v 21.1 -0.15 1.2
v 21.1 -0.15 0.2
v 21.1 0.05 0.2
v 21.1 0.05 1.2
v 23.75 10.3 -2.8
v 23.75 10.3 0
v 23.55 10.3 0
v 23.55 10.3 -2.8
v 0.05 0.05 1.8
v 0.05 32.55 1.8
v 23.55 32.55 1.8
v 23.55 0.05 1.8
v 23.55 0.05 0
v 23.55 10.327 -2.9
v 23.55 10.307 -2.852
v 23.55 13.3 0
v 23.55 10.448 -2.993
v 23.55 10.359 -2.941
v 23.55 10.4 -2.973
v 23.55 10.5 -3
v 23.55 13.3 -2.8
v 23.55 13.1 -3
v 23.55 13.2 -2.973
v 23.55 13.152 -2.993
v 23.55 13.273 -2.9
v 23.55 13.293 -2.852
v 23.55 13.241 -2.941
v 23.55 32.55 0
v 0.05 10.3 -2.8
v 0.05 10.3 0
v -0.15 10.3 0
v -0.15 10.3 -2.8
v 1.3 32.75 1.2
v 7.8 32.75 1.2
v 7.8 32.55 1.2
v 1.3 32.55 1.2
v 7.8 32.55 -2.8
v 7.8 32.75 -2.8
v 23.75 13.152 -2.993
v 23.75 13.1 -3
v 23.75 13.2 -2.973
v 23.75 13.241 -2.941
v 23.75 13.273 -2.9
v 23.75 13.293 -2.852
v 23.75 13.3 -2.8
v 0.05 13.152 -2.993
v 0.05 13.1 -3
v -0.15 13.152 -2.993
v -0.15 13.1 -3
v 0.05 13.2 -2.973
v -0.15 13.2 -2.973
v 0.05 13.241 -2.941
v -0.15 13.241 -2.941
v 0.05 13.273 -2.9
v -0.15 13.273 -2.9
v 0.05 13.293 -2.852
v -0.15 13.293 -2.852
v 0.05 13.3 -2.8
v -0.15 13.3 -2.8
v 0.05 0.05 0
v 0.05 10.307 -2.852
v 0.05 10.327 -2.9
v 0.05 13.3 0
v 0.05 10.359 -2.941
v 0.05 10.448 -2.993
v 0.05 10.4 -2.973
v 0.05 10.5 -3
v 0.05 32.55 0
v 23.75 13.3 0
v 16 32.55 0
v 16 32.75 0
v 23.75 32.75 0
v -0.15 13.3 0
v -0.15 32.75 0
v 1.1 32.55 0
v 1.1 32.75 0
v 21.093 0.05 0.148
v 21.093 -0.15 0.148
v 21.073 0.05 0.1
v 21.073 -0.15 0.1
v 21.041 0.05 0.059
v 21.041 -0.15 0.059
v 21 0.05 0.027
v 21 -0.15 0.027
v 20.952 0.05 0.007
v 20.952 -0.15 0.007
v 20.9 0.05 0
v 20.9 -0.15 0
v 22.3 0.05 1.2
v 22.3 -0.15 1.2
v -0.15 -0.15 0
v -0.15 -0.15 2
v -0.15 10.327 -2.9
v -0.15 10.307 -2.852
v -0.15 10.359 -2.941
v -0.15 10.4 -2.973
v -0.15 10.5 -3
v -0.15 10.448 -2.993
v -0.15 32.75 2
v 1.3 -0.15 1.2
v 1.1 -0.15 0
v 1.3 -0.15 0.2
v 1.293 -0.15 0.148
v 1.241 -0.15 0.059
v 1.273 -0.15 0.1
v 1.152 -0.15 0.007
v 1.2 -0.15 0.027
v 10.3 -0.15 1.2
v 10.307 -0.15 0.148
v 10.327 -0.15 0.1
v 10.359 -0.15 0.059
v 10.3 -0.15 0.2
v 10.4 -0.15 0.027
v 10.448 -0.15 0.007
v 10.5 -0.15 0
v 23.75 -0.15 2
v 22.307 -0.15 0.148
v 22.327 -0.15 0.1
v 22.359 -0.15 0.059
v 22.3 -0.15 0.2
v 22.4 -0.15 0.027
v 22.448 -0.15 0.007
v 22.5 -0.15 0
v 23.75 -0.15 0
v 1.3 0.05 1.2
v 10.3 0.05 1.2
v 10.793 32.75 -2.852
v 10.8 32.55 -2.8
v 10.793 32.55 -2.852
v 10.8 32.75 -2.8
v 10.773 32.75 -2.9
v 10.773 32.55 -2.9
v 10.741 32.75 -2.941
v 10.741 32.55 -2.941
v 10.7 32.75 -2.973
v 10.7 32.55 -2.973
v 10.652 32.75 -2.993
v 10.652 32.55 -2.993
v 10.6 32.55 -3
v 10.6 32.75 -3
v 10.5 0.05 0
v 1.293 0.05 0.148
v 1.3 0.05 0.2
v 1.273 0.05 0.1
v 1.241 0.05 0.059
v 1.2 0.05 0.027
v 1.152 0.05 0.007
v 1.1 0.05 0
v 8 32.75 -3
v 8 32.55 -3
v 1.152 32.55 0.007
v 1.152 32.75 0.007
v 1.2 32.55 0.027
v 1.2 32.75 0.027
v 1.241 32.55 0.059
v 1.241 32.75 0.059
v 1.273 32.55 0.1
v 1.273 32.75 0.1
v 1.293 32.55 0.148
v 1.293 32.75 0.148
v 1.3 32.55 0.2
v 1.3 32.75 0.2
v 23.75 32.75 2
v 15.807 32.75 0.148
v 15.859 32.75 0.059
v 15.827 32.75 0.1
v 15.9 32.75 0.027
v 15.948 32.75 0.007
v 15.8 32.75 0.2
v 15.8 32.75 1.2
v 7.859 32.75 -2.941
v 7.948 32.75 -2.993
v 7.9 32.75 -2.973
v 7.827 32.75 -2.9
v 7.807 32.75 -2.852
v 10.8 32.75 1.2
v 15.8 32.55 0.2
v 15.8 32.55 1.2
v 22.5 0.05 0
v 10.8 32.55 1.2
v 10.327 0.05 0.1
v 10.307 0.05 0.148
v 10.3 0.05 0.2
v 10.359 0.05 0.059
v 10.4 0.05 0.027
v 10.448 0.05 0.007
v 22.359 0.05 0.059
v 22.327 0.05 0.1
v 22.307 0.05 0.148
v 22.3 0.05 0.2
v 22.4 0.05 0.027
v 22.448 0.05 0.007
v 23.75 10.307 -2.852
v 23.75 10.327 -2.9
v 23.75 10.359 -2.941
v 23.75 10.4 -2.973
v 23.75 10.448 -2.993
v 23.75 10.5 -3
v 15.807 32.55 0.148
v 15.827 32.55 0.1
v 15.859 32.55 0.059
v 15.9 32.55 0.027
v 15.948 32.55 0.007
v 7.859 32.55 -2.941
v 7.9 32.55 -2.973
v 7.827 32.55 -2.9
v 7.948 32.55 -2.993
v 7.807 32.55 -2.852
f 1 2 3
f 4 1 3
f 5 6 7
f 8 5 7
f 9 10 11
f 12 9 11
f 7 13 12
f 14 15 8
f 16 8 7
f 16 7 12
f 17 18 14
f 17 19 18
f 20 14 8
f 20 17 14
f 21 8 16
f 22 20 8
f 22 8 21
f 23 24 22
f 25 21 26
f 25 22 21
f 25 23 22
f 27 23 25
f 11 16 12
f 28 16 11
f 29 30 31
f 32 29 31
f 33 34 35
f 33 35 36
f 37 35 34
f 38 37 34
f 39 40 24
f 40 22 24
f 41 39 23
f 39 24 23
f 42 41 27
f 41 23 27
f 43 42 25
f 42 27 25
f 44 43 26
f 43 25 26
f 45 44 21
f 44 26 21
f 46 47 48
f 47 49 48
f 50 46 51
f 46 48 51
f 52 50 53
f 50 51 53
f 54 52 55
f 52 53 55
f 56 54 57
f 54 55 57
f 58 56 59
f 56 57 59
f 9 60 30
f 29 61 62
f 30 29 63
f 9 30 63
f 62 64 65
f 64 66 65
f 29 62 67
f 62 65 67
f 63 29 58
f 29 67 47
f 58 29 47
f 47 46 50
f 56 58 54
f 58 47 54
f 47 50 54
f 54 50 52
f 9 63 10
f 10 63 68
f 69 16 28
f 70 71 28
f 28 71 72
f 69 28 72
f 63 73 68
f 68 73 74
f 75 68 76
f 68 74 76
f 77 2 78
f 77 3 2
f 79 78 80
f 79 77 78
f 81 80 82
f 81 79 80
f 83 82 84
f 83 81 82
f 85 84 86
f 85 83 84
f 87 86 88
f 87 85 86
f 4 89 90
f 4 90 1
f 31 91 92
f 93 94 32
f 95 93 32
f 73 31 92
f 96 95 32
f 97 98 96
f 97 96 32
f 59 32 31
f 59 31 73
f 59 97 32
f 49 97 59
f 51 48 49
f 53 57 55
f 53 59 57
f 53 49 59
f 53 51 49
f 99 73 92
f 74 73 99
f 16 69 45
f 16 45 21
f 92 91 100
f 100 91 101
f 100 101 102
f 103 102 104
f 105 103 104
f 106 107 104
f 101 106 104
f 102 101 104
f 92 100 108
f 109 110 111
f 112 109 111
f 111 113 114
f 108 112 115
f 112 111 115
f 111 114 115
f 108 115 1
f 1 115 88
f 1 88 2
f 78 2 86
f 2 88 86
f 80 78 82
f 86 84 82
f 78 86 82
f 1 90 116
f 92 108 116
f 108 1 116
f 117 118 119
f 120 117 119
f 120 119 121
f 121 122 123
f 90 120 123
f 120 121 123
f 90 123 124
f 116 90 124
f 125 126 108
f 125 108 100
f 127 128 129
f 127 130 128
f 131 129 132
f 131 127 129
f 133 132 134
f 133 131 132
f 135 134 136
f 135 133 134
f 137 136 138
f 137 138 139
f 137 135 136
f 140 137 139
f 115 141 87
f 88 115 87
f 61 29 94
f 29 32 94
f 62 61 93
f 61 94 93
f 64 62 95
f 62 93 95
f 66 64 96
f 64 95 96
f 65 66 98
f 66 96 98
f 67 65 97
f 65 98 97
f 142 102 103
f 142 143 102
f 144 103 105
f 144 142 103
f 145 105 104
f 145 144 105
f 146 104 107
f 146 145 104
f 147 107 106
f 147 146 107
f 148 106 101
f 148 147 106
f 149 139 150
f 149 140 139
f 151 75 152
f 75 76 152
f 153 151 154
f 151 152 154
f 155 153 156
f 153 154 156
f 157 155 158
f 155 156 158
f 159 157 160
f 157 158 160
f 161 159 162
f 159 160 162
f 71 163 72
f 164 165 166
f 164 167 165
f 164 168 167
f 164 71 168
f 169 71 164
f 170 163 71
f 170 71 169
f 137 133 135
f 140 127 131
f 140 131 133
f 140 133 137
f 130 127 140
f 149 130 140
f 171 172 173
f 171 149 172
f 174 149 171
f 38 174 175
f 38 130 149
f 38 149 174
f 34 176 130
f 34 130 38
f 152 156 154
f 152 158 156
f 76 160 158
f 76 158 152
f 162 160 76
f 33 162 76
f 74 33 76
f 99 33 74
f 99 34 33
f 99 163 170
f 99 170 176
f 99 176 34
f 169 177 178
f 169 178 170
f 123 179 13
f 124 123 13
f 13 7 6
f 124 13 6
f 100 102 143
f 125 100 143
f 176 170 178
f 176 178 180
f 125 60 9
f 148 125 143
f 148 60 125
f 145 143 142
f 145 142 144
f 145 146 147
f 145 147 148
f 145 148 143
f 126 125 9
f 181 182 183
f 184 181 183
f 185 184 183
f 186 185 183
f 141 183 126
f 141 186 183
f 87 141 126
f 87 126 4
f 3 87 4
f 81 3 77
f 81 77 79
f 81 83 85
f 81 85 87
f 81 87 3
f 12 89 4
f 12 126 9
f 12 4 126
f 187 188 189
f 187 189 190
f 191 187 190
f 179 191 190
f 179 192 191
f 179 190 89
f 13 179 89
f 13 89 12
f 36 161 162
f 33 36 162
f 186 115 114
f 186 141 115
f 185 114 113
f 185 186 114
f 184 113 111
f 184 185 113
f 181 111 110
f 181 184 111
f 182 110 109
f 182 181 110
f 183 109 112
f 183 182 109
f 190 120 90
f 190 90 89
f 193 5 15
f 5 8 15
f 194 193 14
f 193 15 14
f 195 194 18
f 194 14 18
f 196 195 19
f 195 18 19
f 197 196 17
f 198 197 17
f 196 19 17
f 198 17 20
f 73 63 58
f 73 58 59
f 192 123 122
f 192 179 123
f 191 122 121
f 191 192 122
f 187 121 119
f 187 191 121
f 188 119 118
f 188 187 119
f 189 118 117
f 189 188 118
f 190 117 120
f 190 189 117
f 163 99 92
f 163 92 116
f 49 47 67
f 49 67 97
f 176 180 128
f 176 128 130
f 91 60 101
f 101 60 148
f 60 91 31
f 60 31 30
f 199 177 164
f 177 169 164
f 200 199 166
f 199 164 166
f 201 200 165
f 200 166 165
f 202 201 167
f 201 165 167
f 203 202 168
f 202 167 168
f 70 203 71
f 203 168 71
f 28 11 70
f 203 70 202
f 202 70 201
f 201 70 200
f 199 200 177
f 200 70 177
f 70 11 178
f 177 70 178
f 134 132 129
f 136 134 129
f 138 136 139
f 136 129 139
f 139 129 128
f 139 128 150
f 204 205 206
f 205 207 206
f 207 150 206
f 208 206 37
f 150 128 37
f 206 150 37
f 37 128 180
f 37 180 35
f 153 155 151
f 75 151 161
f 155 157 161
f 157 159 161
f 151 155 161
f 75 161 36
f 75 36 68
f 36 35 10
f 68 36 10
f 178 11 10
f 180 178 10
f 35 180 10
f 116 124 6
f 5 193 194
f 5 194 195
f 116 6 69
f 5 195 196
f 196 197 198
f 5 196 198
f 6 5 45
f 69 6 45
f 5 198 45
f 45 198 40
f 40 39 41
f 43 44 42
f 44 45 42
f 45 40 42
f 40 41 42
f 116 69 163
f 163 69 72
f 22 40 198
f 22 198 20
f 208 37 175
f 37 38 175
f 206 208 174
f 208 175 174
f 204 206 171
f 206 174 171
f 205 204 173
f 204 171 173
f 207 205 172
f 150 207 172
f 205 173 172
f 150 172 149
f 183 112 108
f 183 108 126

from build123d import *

# Parameters (mm, degrees)
SKETCH_1_W          = 23.9
SKETCH_1_H          = 32.9
EXTRUDE_1_DEPTH     = 2
SHELL_1_T           = -0.2
SKETCH_3_2_W        = 9
SKETCH_3_2_H        = 0.2
SKETCH_3_2_W_2      = 1.2
SKETCH_3_2_W_3      = 5
SKETCH_3_2_W_4      = 6.5
CUT_EXTRUDE_3_DEPTH = 1.2
SKETCH_3_W          = 3
SKETCH_3_H          = 0.2
SKETCH_3_W_2        = 0.2
SKETCH_3_H_2        = 3
EXTRUDE_2_DEPTH     = 3
FILLET_1_R          = 0.2


with BuildPart() as part:
    # Sketch 1 → Extrude 1 (new body)
    with BuildSketch(Plane.XY):
        with Locations((11.8, 16.3)):
            Rectangle(SKETCH_1_W, SKETCH_1_H)
    extrude(amount=EXTRUDE_1_DEPTH)

    # Shell 1
    shell_1_openings = [part.faces().sort_by_distance(p)[0] for p in [
        (11.8, 16.3, 0),
    ]]
    offset(amount=SHELL_1_T, openings=shell_1_openings, kind=Kind.INTERSECTION)

    # Sketch 3_2 → Cut-Extrude 3 (cut)
    with BuildSketch(Plane(origin=(0, 0, 0), x_dir=(-1, 0, 0), z_dir=(0, 0, -1))):
        with Locations((-5.8, -0.05)):
            Rectangle(SKETCH_3_2_W, SKETCH_3_2_H)
        with Locations((-21.7, -0.05)):
            Rectangle(SKETCH_3_2_W_2, SKETCH_3_2_H)
        with Locations((-13.3, 32.65)):
            Rectangle(SKETCH_3_2_W_3, SKETCH_3_2_H)
        with Locations((-4.55, 32.65)):
            Rectangle(SKETCH_3_2_W_4, SKETCH_3_2_H)
    extrude(amount=-CUT_EXTRUDE_3_DEPTH, mode=Mode.SUBTRACT)

    # Sketch 3 → Extrude 2 (add)
    with BuildSketch(Plane(origin=(0, 0, 0), x_dir=(-1, 0, 0), z_dir=(0, 0, -1))):
        with Locations((-9.3, 32.65)):
            Rectangle(SKETCH_3_W, SKETCH_3_H)
        with Locations((-23.65, 11.8)):
            Rectangle(SKETCH_3_W_2, SKETCH_3_H_2)
        with Locations((0.05, 11.8)):
            Rectangle(SKETCH_3_W_2, SKETCH_3_H_2)
    extrude(amount=EXTRUDE_2_DEPTH)

    # Fillet 1
    fillet_1_edges = [part.edges().sort_by_distance(p)[0] for p in [
        (-0.05, 13.3, -3),
        (-0.05, 10.3, -3),
        (23.65, 13.3, -3),
        (23.65, 10.3, -3),
        (1.3, -0.05, 0),
        (10.3, -0.05, 0),
        (21.1, -0.05, 0),
        (22.3, -0.05, 0),
        (15.8, 32.65, 0),
        (1.3, 32.65, 0),
        (7.8, 32.65, -3),
        (10.8, 32.65, -3),
    ]]
    fillet(fillet_1_edges, radius=FILLET_1_R)


solid = part.part
